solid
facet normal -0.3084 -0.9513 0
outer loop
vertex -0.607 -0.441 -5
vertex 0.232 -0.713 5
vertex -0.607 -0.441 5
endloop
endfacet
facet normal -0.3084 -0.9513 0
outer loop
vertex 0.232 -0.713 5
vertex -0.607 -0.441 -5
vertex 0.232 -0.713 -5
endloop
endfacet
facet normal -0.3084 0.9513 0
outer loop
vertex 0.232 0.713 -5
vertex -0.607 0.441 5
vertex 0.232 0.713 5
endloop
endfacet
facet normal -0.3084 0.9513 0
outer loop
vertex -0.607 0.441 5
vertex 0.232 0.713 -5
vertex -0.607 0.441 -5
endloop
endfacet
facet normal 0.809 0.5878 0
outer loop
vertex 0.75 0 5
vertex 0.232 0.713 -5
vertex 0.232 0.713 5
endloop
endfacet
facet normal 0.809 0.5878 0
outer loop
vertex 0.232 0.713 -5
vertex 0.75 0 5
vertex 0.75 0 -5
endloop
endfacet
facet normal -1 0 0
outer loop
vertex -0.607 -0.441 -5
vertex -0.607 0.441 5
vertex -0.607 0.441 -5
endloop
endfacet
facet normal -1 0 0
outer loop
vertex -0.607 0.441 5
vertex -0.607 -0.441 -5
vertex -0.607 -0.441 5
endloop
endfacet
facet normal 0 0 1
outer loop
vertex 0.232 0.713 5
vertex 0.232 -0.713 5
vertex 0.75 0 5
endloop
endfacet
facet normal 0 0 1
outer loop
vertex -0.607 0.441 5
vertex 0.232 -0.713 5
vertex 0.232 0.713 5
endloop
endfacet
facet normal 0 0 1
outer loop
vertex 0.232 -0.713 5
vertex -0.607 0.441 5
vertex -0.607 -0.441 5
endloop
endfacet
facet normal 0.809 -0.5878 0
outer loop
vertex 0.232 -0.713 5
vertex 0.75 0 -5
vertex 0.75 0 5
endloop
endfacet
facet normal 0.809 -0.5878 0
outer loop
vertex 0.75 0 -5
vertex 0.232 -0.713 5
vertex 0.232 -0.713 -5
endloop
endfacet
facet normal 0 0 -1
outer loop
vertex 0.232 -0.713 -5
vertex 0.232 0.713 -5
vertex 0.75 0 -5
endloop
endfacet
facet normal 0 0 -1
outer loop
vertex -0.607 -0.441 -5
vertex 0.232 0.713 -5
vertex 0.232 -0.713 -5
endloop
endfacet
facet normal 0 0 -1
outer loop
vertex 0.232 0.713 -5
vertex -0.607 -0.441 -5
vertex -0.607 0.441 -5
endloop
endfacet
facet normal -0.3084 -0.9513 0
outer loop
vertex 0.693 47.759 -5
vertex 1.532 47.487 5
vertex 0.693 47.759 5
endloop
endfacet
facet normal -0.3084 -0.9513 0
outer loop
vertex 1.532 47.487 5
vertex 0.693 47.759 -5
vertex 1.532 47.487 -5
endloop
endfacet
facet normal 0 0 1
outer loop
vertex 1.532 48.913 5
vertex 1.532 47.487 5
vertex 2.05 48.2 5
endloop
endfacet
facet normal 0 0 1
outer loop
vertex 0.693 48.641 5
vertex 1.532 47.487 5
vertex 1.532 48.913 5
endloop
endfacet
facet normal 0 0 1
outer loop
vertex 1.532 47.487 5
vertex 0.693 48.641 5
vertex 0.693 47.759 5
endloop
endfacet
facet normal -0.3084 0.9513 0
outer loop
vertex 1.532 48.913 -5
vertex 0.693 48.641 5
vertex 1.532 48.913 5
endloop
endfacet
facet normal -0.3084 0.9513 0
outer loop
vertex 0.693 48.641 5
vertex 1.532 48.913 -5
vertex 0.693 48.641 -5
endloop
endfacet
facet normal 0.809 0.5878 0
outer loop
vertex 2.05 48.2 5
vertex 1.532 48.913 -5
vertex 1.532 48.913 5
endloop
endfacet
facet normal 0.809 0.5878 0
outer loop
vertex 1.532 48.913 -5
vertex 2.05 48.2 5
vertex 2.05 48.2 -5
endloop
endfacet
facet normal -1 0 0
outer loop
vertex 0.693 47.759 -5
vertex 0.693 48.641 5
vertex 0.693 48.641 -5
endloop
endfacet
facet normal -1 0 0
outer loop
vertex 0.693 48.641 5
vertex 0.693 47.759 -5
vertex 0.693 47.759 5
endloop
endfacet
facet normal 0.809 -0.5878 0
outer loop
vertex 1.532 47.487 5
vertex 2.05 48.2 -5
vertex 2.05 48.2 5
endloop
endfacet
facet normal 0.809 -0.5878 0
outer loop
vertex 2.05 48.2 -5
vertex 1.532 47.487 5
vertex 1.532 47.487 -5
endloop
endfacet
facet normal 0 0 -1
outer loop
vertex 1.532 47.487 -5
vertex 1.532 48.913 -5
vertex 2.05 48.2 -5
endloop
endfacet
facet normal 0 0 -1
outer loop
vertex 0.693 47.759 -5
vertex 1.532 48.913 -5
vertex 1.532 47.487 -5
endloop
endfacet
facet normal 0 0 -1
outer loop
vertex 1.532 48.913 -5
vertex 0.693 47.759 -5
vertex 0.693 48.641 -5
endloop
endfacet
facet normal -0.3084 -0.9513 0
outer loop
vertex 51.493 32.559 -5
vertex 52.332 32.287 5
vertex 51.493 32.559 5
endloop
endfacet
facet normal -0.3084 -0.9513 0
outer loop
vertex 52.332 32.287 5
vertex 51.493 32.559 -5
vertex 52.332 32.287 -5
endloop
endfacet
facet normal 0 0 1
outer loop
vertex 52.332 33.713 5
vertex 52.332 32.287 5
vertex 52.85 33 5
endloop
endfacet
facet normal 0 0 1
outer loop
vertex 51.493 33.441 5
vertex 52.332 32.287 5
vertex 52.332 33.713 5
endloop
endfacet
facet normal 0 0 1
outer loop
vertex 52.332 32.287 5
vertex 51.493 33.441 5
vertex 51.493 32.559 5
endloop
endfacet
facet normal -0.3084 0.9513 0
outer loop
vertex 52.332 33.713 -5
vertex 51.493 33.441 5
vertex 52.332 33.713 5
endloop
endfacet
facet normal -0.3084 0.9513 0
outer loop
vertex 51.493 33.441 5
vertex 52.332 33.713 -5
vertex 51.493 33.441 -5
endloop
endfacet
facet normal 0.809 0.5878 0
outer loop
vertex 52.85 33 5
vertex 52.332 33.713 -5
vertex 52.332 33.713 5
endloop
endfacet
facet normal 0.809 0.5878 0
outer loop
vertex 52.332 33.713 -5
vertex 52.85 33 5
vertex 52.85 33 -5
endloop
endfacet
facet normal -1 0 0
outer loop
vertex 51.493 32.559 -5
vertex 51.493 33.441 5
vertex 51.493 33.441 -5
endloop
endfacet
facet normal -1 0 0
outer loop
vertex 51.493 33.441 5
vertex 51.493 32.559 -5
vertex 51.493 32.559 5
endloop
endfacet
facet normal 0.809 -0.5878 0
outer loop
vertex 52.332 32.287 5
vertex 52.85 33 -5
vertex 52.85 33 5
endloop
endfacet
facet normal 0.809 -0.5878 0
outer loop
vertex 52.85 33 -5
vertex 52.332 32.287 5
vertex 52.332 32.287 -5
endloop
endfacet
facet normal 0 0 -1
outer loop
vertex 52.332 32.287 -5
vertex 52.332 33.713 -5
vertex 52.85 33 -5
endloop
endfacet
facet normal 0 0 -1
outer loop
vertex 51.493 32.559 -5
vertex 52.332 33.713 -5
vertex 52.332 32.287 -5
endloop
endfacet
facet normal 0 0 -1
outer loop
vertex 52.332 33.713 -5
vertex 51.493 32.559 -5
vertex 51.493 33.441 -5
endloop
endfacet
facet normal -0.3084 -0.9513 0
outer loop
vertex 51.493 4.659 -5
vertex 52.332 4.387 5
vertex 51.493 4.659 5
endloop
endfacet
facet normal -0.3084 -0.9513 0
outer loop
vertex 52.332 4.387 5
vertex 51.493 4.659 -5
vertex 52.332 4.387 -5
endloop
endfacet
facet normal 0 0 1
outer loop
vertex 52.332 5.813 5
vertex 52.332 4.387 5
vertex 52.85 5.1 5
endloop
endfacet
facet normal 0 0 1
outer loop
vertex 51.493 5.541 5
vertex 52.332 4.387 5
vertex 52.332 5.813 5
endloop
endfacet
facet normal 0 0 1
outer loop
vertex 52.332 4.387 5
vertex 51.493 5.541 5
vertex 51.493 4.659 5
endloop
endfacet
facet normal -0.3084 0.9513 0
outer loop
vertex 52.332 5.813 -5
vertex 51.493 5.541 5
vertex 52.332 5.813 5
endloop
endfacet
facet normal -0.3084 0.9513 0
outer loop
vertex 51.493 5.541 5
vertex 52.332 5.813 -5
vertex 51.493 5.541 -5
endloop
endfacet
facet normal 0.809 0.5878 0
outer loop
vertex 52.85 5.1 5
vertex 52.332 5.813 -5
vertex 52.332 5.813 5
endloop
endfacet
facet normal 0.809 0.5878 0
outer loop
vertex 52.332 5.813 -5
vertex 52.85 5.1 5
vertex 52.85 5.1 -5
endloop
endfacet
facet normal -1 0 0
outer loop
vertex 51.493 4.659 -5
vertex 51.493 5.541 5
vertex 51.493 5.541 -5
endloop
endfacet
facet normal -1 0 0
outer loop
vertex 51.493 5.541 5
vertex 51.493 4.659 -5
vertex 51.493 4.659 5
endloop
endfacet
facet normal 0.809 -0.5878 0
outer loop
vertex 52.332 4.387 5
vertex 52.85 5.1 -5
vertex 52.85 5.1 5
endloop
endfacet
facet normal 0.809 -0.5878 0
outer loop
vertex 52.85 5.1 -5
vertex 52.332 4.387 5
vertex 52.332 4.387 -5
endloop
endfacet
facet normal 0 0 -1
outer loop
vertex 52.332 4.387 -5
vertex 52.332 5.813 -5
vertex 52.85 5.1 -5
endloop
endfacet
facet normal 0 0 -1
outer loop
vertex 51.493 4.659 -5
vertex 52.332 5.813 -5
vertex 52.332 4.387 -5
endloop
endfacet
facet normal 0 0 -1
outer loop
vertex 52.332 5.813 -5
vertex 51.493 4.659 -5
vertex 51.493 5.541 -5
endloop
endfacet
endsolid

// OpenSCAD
// http://cl.ly/image/3v1B0L081N0Z

module arduino_mount(height, radius) {
  cylinder(h=height, r=radius, center=true);
  translate([1.3,48.2,0]) cylinder(h=height, r=radius, center=true);
  translate([52.1,33,0]) cylinder(h=height, r=radius, center=true);
  translate([52.1,5.1,0]) cylinder(h=height, r=radius, center=true);
}

arduino_mount(10, 0.75);
